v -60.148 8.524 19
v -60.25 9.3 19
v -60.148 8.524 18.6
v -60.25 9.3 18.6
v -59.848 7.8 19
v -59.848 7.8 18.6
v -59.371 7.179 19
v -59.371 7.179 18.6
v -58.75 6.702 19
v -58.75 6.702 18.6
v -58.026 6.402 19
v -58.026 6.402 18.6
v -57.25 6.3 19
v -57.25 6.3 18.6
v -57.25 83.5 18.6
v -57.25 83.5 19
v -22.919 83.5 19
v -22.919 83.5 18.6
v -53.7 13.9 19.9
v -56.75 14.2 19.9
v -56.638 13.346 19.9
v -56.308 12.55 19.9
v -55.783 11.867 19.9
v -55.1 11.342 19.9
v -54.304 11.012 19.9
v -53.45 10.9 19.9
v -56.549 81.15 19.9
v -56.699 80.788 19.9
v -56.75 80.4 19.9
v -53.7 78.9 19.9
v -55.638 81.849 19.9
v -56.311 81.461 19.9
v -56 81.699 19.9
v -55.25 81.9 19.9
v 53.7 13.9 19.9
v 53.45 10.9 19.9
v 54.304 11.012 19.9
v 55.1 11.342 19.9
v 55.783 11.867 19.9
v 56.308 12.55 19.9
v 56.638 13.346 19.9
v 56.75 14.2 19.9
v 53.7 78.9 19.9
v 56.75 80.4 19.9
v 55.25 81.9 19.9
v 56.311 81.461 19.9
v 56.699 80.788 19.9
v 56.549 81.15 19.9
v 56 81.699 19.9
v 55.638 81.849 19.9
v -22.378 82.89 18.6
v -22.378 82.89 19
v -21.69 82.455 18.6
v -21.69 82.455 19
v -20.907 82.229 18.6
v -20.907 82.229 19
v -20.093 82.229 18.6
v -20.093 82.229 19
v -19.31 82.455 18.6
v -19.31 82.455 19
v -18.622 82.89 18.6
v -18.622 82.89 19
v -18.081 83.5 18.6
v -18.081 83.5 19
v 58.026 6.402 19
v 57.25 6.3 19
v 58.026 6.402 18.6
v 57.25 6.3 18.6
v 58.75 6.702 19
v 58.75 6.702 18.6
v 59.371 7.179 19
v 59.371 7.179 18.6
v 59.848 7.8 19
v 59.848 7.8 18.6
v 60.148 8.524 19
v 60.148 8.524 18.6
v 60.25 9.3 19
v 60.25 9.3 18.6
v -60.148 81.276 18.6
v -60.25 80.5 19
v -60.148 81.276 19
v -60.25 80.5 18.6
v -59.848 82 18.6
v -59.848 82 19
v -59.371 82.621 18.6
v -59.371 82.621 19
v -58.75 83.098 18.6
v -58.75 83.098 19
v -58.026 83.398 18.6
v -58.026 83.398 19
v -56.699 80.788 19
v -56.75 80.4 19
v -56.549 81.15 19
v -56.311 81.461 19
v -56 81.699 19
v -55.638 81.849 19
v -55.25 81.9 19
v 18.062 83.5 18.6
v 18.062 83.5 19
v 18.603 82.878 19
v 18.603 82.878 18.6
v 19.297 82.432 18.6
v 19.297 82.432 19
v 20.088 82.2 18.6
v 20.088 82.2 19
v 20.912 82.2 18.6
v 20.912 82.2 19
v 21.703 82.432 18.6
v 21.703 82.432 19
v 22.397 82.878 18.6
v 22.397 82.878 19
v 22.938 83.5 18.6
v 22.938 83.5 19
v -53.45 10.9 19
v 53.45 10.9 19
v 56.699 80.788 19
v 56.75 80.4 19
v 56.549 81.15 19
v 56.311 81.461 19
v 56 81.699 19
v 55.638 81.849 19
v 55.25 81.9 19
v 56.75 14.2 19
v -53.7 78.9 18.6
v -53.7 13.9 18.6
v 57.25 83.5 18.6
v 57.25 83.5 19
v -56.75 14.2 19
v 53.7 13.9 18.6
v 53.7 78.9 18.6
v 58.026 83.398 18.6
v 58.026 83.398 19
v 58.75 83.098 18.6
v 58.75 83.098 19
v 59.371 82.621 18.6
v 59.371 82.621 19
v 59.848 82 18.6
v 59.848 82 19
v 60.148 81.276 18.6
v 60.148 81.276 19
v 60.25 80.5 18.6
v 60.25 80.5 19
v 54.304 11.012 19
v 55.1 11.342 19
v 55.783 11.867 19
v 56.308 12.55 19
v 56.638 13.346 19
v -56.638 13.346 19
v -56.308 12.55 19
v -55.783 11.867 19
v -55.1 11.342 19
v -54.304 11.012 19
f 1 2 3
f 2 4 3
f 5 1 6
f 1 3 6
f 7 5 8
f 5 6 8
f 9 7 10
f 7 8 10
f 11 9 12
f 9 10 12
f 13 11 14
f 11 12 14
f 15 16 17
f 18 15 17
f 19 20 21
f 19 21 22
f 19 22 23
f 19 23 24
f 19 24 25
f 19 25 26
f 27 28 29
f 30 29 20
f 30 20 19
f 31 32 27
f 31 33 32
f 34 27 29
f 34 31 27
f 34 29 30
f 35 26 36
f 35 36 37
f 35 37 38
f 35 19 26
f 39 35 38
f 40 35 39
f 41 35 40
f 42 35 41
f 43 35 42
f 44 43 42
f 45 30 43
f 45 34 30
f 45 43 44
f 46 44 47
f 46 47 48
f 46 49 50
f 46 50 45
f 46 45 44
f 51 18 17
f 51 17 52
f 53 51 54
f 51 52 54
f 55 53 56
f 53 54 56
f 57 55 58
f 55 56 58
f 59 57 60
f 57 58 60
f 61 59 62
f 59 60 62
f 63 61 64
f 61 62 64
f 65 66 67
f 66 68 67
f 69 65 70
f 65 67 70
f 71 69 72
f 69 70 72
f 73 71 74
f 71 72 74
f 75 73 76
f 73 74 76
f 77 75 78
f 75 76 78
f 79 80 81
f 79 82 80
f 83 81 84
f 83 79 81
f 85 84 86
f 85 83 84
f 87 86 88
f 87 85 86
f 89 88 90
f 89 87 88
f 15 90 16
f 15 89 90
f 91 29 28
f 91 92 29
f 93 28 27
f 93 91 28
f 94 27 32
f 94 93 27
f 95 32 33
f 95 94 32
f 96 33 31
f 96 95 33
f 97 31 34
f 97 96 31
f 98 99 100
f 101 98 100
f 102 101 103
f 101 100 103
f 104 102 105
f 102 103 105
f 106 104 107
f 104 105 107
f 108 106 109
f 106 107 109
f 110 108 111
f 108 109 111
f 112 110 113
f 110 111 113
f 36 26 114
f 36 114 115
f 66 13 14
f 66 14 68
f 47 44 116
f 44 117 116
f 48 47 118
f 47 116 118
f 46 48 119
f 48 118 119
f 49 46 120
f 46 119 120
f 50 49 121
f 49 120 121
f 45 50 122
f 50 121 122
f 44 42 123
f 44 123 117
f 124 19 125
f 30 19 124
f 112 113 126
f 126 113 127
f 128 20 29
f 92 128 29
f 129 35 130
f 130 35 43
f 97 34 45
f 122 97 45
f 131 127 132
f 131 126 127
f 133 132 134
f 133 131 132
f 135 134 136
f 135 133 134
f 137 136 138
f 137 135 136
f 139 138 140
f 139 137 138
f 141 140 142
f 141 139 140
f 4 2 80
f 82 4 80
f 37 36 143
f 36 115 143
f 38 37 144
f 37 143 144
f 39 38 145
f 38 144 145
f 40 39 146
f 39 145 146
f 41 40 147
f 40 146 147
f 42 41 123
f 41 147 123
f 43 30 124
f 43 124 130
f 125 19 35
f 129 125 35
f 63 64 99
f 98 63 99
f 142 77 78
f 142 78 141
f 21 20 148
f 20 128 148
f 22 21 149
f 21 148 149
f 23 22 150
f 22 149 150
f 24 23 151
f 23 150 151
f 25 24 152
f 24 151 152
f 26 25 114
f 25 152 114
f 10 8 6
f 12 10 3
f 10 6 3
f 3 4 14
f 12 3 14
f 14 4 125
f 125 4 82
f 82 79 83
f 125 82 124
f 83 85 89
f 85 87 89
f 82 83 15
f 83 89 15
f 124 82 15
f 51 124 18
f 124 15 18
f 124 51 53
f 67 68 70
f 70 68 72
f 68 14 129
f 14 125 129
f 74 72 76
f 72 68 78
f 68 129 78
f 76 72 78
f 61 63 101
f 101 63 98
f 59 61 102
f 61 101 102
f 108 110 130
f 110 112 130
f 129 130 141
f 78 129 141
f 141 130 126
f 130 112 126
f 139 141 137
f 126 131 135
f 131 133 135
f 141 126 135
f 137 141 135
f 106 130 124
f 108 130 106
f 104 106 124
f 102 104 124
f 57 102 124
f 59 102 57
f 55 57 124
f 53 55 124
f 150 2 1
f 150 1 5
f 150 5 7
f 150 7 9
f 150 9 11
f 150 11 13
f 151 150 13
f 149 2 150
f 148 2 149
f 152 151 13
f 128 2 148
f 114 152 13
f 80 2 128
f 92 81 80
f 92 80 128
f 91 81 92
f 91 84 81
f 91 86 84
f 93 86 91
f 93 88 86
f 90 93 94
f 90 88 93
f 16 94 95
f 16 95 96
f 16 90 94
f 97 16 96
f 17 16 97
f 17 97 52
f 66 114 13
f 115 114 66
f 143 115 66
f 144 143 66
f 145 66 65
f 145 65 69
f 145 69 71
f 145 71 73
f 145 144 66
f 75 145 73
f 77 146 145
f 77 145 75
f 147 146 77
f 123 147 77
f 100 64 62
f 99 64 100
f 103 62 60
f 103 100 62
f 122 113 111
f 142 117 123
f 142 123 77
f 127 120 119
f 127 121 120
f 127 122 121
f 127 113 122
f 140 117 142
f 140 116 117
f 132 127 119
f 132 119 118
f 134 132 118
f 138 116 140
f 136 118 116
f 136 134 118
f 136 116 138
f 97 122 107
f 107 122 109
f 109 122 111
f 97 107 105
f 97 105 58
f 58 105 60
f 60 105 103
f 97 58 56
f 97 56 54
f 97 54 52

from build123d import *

# Parameters (mm, degrees)
SKIZZE2_W                       = 113.5
SKIZZE2_H                       = 71
AUFSATZ_LINEAR_AUSTRAGEN1_DEPTH = 1.3
AUFSATZ_LINEAR_START            = -0.9
SKIZZE3_W                       = 120.5
SKIZZE3_H                       = 77.2
AUFSATZ_LINEAR_AUSTRAGEN2_DEPTH = 0.4
SKIZZE4_W                       = 107.4
SKIZZE4_H                       = 65
SCHNITT_LINEAR_AUSTRAGEN1_DEPTH = 103.975737434
VERRUNDUNG1_R                   = 1.5
VERRUNDUNG2_R                   = 3.3
VERRUNDUNG3_R                   = 3
SKIZZE5_R                       = 2.9
SCHNITT_LINEAR_AUSTRAGEN2_DEPTH = 103.975737434


with BuildPart() as part:
    # Skizze2 → Aufsatz-Linear austragen1 (new body)
    with BuildSketch(Plane.XY.offset(19.9)):
        with Locations((0, 46.4)):
            Rectangle(SKIZZE2_W, SKIZZE2_H)
    extrude(amount=-AUFSATZ_LINEAR_AUSTRAGEN1_DEPTH)

    # Skizze3 → Aufsatz-Linear austragen2 (add)
    with BuildSketch(Plane.XY.offset(19.9).offset(AUFSATZ_LINEAR_START)):
        with Locations((0, 44.9)):
            Rectangle(SKIZZE3_W, SKIZZE3_H)
    extrude(amount=-AUFSATZ_LINEAR_AUSTRAGEN2_DEPTH)

    # Skizze4 → Schnitt-Linear austragen1 (cut, through all)
    with BuildSketch(Plane.XY.offset(19.9)):
        with Locations((0, 46.4)):
            Rectangle(SKIZZE4_W, SKIZZE4_H)
    extrude(amount=-SCHNITT_LINEAR_AUSTRAGEN1_DEPTH, mode=Mode.SUBTRACT)

    # Verrundung1
    verrundung1_edges = [part.edges().sort_by_distance(p)[0] for p in [
        (56.75, 81.9, 19.45),
        (-56.75, 81.9, 19.45),
    ]]
    fillet(verrundung1_edges, radius=VERRUNDUNG1_R)

    # Verrundung2
    verrundung2_edges = [part.edges().sort_by_distance(p)[0] for p in [
        (-56.75, 10.9, 19.45),
        (56.75, 10.9, 19.45),
    ]]
    fillet(verrundung2_edges, radius=VERRUNDUNG2_R)

    # Verrundung3
    verrundung3_edges = [part.edges().sort_by_distance(p)[0] for p in [
        (60.25, 83.5, 18.8),
        (60.25, 6.3, 18.8),
        (-60.25, 6.3, 18.8),
        (-60.25, 83.5, 18.8),
    ]]
    fillet(verrundung3_edges, radius=VERRUNDUNG3_R)

    # Skizze5 → Schnitt-Linear austragen2 (cut, through all)
    with BuildSketch(Plane.XY.offset(19.9)):
        with Locations((20.5, 85.070858308)):
            Circle(SKIZZE5_R)
        with Locations((-20.5, 85.1)):
            Circle(SKIZZE5_R)
    extrude(amount=-SCHNITT_LINEAR_AUSTRAGEN2_DEPTH, mode=Mode.SUBTRACT)


solid = part.part
